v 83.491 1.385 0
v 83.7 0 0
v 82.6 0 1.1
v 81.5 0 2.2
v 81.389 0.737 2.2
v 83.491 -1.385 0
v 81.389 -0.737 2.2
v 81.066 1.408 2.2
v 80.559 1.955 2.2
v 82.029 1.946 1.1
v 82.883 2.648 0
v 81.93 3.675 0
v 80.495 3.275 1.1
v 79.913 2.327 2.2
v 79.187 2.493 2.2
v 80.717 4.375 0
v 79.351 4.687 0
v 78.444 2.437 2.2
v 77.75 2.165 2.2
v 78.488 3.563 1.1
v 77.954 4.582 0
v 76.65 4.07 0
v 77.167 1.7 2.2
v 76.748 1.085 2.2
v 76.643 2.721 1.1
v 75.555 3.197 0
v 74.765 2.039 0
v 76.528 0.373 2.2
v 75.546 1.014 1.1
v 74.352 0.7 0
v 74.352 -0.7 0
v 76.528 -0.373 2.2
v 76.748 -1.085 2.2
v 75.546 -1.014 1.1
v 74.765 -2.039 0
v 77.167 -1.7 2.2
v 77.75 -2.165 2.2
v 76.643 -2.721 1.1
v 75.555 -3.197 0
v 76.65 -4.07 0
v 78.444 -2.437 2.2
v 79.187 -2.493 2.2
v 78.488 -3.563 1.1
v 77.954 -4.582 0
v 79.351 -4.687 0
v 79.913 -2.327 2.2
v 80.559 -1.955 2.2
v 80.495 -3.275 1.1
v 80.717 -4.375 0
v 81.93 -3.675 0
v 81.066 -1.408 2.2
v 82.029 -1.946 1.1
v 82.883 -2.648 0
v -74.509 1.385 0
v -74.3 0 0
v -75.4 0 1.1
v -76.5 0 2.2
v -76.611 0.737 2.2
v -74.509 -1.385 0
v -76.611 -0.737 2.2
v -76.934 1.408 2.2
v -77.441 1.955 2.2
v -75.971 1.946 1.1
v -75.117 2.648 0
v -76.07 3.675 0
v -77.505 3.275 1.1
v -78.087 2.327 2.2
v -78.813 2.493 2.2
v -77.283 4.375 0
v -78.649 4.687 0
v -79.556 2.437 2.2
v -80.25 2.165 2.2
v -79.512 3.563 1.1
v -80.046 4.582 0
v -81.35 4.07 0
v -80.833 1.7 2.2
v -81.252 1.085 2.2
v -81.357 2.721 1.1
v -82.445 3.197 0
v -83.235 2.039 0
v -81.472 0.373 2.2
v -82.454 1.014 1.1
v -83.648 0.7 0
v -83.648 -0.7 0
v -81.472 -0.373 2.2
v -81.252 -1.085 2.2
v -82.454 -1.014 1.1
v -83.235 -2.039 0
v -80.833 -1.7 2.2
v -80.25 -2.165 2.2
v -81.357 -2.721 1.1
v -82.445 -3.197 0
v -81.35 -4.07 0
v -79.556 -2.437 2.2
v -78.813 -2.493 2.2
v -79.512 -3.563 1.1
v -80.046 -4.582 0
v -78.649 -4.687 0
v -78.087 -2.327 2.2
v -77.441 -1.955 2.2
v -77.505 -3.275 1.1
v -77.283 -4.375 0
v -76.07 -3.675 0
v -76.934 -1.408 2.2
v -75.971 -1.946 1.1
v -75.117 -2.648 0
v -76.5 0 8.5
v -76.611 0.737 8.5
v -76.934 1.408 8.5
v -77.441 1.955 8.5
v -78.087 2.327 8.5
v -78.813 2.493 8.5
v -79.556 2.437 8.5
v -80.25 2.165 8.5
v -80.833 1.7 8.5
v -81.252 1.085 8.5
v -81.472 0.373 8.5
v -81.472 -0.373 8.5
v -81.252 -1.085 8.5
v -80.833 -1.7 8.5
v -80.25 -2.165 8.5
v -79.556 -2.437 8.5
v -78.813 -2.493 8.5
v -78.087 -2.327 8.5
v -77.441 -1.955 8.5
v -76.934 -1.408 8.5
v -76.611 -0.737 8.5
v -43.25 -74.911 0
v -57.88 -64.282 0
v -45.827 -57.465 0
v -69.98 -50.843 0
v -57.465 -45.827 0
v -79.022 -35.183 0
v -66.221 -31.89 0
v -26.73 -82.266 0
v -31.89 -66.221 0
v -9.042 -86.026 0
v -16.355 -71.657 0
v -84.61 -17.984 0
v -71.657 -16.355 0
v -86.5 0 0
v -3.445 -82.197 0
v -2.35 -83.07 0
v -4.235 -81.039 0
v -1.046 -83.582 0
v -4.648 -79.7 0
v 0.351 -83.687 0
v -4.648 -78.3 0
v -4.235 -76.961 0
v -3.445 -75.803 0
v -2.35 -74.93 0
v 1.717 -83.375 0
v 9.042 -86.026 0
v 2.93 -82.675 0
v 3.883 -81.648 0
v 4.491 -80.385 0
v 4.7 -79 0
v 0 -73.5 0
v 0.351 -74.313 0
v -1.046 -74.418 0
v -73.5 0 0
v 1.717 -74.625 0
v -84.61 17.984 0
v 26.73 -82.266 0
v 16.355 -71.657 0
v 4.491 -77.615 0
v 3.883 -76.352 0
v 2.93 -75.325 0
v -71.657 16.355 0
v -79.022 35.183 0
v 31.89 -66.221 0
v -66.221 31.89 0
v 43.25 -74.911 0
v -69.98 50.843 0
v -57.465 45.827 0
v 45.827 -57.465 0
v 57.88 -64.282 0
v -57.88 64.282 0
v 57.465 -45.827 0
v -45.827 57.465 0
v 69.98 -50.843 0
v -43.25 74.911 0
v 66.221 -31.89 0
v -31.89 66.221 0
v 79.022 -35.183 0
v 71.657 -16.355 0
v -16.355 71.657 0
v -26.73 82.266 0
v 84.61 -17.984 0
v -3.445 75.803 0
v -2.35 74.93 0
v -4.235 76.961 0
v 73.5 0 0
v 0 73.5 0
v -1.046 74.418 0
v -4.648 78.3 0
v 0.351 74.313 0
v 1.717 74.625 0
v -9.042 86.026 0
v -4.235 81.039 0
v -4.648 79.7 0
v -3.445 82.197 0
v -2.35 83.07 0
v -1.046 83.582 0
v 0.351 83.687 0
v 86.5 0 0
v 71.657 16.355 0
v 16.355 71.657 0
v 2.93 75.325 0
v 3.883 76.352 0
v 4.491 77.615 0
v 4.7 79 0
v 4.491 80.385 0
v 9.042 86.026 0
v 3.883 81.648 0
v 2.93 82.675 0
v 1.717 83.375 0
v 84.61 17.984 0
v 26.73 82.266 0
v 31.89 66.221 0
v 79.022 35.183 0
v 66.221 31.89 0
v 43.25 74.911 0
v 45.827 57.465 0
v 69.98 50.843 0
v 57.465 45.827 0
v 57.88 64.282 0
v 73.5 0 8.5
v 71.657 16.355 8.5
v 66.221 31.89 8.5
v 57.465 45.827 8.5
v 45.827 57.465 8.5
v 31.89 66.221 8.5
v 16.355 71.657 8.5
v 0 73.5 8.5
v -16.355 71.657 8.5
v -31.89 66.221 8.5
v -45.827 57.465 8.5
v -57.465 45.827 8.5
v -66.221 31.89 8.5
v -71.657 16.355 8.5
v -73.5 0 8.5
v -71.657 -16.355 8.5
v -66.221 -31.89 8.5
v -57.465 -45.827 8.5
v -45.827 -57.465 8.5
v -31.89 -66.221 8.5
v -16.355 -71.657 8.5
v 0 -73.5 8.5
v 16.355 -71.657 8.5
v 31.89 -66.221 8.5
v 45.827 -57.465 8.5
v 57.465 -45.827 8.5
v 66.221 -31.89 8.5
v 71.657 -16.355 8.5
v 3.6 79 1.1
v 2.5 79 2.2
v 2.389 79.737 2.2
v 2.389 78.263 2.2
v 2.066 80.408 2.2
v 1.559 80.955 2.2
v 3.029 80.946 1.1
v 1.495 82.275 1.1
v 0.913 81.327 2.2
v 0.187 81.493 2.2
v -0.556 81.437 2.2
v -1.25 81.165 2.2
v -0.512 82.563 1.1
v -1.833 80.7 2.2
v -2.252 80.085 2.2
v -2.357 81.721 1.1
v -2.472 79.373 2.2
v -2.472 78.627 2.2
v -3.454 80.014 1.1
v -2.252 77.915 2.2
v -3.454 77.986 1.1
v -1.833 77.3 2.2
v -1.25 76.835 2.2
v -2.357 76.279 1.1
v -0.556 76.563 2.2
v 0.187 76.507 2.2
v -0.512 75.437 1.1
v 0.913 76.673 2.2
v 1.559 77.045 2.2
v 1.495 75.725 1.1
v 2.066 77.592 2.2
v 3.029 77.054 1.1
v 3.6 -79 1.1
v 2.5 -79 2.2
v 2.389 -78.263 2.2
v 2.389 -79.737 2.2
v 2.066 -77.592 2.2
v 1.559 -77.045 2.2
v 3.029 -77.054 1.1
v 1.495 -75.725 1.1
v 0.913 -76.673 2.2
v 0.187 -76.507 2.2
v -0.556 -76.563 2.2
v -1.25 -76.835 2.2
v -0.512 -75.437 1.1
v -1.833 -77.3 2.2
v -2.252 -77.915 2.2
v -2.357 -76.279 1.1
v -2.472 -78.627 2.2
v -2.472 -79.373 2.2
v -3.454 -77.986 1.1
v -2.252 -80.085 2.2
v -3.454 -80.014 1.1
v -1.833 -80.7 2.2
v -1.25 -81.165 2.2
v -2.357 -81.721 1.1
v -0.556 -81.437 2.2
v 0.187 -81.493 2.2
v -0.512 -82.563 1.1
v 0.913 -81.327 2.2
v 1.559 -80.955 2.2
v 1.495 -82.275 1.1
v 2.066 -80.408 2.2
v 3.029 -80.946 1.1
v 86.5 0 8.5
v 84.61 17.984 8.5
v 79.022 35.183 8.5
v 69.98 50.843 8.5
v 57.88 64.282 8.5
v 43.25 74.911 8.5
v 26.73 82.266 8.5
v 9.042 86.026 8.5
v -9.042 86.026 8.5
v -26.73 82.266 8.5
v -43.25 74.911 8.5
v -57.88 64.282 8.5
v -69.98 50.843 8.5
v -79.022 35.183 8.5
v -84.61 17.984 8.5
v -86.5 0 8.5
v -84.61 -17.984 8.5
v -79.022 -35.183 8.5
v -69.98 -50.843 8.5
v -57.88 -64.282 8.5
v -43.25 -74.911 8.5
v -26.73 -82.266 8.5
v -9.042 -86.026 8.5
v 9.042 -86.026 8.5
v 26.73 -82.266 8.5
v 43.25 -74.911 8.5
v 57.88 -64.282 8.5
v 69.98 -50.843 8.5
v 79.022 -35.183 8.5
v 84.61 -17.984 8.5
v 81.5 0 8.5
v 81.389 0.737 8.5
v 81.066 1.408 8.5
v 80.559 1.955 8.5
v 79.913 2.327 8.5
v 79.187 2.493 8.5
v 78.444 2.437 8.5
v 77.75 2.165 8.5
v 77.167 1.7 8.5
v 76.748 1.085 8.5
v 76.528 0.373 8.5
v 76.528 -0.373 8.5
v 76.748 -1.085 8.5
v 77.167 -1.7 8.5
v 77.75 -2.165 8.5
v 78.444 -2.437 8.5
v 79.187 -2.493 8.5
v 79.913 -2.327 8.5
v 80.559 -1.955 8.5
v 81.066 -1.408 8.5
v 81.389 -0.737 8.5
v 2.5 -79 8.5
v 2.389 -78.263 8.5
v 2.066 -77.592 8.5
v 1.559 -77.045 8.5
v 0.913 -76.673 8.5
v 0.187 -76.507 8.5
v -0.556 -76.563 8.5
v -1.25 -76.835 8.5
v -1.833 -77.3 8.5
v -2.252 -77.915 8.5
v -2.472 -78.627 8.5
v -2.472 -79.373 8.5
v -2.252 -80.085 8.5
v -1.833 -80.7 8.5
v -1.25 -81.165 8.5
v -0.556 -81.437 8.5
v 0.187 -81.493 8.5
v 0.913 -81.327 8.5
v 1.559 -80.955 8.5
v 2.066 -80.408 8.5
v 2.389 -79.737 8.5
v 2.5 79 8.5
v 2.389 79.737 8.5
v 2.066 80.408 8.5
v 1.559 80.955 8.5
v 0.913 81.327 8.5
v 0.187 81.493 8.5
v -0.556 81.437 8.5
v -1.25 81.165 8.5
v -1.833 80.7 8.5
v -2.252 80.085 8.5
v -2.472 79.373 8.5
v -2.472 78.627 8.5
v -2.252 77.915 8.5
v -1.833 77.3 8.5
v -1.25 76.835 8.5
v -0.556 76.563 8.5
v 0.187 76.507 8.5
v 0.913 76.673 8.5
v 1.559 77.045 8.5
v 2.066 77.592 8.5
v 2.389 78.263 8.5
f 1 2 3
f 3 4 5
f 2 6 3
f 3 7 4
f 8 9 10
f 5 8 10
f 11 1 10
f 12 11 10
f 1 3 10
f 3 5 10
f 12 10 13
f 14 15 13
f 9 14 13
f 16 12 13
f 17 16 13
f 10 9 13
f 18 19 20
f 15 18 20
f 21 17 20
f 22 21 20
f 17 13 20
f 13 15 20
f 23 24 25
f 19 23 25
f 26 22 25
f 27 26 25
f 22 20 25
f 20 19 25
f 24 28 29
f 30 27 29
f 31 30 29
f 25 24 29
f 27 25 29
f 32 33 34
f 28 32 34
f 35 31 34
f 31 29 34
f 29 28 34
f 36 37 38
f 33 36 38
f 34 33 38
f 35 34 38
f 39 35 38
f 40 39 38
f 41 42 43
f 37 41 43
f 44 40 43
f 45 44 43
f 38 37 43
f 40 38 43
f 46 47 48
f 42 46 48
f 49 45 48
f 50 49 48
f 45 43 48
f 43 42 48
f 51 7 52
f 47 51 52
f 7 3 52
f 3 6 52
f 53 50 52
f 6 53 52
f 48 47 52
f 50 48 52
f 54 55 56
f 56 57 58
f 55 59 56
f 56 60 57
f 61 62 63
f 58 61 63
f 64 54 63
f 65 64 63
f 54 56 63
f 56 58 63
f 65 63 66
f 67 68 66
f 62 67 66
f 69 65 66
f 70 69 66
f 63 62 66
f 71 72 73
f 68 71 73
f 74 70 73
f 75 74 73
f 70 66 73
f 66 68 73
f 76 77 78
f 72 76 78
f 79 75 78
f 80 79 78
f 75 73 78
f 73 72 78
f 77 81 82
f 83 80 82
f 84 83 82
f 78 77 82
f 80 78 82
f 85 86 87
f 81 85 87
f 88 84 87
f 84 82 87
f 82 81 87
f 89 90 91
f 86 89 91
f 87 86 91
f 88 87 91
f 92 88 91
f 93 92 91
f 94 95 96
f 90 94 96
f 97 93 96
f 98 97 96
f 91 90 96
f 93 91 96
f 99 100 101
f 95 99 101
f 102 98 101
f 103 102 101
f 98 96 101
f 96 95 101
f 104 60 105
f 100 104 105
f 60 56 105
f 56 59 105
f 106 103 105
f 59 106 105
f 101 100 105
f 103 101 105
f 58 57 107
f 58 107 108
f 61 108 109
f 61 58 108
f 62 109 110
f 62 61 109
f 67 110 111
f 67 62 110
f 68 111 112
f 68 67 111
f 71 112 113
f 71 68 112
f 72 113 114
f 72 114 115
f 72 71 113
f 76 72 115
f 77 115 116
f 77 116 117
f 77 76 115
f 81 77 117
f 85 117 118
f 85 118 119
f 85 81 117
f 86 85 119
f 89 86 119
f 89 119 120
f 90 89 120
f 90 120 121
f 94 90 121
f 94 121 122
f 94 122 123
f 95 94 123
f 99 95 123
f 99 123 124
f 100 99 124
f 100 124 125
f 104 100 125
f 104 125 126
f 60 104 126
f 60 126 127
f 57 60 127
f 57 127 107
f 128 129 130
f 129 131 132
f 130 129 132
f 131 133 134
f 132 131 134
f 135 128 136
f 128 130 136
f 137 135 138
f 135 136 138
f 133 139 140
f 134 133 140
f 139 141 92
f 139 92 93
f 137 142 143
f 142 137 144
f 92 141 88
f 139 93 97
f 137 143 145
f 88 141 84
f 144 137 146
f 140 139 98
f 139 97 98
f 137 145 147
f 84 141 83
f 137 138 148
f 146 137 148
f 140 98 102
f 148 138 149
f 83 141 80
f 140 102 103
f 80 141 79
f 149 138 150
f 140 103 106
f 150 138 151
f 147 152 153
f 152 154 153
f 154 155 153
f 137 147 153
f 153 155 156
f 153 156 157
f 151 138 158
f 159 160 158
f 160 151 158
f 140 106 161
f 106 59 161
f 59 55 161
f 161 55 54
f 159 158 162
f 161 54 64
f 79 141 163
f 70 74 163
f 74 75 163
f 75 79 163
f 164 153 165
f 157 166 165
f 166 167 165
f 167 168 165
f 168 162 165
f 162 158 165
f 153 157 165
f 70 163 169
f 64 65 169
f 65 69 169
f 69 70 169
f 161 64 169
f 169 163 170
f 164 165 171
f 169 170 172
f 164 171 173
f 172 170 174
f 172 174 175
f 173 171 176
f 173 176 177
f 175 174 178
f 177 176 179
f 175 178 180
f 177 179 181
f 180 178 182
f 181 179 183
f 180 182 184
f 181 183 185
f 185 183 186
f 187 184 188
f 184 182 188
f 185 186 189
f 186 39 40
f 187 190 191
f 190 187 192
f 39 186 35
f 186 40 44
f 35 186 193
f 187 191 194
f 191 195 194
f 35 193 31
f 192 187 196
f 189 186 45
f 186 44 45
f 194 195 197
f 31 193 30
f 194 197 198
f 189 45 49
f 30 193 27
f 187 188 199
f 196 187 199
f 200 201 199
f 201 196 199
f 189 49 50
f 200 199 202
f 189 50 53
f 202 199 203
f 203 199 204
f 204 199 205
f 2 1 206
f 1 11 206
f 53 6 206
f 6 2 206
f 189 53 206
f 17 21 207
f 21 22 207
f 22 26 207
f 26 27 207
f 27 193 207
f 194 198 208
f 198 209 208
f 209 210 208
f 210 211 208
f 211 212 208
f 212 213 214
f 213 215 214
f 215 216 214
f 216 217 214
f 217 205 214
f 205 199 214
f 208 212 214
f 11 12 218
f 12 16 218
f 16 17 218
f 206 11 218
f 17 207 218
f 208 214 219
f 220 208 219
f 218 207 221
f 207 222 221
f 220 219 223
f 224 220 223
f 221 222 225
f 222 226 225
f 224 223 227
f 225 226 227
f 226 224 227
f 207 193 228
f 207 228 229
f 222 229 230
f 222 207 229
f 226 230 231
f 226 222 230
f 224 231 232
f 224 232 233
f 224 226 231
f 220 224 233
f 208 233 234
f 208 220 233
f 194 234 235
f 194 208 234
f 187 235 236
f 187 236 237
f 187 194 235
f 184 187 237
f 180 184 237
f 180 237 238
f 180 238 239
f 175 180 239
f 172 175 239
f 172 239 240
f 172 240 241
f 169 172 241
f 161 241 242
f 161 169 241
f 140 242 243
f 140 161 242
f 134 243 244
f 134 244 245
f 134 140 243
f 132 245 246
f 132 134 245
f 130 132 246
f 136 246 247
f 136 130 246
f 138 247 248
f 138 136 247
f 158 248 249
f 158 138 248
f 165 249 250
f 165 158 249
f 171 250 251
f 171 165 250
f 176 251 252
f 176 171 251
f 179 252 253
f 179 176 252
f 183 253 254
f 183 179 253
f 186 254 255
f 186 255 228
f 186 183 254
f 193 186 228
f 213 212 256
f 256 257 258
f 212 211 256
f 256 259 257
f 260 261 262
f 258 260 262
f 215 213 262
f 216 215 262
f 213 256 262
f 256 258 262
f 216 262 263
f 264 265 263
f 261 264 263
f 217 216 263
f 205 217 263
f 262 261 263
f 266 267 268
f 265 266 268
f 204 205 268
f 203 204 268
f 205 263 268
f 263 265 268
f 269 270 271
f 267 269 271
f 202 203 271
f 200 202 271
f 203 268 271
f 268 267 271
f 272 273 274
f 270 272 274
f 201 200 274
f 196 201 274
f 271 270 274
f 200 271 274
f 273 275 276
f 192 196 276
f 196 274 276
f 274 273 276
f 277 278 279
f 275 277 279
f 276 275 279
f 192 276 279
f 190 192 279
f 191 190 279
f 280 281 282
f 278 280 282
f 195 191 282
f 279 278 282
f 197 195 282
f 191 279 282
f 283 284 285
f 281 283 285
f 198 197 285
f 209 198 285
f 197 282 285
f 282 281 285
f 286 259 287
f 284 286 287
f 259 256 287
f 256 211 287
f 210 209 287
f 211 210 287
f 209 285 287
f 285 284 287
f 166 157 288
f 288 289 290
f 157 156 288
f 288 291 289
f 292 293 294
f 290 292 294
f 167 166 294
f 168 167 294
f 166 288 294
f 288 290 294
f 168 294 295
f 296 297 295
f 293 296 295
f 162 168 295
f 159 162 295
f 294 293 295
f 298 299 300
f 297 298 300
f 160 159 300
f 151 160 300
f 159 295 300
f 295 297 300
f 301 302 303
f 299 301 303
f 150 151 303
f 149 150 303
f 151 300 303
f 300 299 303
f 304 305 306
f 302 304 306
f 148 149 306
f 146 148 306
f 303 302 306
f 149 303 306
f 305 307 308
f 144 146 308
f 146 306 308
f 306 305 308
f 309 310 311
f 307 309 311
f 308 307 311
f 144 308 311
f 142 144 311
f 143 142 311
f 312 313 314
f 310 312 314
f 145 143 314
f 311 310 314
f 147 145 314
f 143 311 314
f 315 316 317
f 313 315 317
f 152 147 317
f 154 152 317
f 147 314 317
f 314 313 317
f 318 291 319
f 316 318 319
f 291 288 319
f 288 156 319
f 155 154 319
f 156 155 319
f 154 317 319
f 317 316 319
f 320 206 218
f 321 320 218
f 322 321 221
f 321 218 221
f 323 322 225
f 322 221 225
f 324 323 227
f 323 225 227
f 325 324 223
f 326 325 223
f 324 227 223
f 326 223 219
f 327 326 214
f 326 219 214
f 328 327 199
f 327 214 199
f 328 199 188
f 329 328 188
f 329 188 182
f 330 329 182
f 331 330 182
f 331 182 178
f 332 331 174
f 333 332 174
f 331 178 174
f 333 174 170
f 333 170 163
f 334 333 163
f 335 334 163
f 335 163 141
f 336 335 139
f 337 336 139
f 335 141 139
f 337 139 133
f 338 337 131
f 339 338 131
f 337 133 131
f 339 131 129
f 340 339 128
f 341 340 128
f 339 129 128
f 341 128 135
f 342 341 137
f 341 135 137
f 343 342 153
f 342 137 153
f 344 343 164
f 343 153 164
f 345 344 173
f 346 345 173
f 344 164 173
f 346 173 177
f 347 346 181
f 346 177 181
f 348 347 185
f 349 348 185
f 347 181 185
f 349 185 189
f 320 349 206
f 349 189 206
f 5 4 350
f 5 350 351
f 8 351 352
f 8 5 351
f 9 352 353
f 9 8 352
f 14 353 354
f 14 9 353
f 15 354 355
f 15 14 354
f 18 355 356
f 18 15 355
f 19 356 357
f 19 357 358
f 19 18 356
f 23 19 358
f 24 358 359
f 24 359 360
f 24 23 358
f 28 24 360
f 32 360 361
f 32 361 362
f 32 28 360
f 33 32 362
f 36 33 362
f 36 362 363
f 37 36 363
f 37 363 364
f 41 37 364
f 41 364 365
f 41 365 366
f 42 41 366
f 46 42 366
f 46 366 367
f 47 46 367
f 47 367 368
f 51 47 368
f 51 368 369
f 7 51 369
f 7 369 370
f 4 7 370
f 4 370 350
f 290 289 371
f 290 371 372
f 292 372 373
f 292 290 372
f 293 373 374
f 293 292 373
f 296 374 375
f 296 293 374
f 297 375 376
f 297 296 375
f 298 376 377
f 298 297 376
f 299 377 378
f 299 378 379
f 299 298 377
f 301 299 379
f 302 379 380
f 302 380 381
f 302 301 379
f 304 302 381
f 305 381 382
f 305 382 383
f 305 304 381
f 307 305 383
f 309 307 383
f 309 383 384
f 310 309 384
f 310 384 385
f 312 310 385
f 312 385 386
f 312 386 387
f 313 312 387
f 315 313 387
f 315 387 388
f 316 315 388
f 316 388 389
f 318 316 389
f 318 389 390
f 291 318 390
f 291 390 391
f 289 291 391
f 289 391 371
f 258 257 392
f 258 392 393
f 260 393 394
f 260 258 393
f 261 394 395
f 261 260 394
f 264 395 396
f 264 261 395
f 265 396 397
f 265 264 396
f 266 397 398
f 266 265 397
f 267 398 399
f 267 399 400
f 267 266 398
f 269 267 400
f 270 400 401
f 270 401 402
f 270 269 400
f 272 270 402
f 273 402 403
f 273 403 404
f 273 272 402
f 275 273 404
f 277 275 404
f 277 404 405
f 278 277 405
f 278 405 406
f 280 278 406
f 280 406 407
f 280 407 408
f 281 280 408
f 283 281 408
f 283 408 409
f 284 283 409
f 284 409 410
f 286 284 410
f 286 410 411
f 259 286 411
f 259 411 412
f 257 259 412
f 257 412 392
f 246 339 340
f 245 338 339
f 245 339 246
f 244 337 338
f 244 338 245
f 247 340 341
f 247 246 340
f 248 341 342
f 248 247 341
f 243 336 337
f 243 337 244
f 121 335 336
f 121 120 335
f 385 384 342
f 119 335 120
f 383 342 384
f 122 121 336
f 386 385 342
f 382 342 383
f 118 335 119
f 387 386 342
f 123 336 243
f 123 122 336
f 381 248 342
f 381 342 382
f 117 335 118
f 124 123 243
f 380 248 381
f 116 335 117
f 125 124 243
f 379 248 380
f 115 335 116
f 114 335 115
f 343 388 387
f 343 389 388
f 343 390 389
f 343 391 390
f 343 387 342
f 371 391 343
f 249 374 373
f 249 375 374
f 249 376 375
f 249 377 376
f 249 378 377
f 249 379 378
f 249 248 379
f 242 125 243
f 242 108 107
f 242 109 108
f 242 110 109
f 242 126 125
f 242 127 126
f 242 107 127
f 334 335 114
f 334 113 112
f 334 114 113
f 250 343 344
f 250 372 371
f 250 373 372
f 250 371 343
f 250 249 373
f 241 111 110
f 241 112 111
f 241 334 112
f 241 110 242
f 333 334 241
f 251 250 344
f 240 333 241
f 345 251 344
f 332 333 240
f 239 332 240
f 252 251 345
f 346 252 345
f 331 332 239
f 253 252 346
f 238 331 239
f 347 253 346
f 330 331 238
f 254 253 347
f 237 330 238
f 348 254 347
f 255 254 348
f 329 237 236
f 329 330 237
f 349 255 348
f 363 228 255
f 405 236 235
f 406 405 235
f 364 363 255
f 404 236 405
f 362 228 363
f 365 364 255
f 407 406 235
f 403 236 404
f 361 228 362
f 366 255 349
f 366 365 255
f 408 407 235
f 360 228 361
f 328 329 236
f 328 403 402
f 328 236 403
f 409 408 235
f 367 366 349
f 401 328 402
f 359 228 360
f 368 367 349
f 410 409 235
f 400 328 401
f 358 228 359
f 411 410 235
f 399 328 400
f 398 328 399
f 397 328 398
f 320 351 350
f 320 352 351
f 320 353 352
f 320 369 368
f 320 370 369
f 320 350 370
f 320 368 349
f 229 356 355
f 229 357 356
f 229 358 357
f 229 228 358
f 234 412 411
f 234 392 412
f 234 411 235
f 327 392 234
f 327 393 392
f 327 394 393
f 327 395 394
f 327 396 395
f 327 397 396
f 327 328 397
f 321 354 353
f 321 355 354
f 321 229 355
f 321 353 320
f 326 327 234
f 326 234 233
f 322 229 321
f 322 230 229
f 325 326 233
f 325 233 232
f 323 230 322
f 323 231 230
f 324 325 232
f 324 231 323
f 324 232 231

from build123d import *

# Parameters (mm, degrees)
SKETCH_1_R                   = 86.5
SKETCH_1_R_2                 = 73.5
SKETCH_1_R_3                 = 2.5
EXTRUDE_1_DEPTH              = 8.5
HOLE_WIZARD_M4_1_D           = 4.8
HOLE_WIZARD_M4_1_CSINK_D     = 9.4
HOLE_WIZARD_M4_1_CSINK_ANGLE = 90


with BuildPart() as part:
    # ｽｹｯﾁ1 → ﾎﾞｽ - 押し出し1 (new body)
    with BuildSketch(Plane.XY):
        Circle(SKETCH_1_R)
        Circle(SKETCH_1_R_2, mode=Mode.SUBTRACT)
        with Locations((0, 79)):
            Circle(SKETCH_1_R_3, mode=Mode.SUBTRACT)
        with Locations((79, 0)):
            Circle(SKETCH_1_R_3, mode=Mode.SUBTRACT)
        with Locations((0, -79)):
            Circle(SKETCH_1_R_3, mode=Mode.SUBTRACT)
        with Locations((-79, 0)):
            Circle(SKETCH_1_R_3, mode=Mode.SUBTRACT)
    extrude(amount=EXTRUDE_1_DEPTH)

    # M4 丸皿ねじ用皿穴1 (through all)
    with Locations(Plane(origin=(0, 0, 0), x_dir=(-1, 0, 0), z_dir=(0, 0, -1))):
        with Locations((-79, 0), (79, 0), (0, 79), (0, -79)):
            CounterSinkHole(HOLE_WIZARD_M4_1_D / 2, HOLE_WIZARD_M4_1_CSINK_D / 2, counter_sink_angle=HOLE_WIZARD_M4_1_CSINK_ANGLE)


solid = part.part
